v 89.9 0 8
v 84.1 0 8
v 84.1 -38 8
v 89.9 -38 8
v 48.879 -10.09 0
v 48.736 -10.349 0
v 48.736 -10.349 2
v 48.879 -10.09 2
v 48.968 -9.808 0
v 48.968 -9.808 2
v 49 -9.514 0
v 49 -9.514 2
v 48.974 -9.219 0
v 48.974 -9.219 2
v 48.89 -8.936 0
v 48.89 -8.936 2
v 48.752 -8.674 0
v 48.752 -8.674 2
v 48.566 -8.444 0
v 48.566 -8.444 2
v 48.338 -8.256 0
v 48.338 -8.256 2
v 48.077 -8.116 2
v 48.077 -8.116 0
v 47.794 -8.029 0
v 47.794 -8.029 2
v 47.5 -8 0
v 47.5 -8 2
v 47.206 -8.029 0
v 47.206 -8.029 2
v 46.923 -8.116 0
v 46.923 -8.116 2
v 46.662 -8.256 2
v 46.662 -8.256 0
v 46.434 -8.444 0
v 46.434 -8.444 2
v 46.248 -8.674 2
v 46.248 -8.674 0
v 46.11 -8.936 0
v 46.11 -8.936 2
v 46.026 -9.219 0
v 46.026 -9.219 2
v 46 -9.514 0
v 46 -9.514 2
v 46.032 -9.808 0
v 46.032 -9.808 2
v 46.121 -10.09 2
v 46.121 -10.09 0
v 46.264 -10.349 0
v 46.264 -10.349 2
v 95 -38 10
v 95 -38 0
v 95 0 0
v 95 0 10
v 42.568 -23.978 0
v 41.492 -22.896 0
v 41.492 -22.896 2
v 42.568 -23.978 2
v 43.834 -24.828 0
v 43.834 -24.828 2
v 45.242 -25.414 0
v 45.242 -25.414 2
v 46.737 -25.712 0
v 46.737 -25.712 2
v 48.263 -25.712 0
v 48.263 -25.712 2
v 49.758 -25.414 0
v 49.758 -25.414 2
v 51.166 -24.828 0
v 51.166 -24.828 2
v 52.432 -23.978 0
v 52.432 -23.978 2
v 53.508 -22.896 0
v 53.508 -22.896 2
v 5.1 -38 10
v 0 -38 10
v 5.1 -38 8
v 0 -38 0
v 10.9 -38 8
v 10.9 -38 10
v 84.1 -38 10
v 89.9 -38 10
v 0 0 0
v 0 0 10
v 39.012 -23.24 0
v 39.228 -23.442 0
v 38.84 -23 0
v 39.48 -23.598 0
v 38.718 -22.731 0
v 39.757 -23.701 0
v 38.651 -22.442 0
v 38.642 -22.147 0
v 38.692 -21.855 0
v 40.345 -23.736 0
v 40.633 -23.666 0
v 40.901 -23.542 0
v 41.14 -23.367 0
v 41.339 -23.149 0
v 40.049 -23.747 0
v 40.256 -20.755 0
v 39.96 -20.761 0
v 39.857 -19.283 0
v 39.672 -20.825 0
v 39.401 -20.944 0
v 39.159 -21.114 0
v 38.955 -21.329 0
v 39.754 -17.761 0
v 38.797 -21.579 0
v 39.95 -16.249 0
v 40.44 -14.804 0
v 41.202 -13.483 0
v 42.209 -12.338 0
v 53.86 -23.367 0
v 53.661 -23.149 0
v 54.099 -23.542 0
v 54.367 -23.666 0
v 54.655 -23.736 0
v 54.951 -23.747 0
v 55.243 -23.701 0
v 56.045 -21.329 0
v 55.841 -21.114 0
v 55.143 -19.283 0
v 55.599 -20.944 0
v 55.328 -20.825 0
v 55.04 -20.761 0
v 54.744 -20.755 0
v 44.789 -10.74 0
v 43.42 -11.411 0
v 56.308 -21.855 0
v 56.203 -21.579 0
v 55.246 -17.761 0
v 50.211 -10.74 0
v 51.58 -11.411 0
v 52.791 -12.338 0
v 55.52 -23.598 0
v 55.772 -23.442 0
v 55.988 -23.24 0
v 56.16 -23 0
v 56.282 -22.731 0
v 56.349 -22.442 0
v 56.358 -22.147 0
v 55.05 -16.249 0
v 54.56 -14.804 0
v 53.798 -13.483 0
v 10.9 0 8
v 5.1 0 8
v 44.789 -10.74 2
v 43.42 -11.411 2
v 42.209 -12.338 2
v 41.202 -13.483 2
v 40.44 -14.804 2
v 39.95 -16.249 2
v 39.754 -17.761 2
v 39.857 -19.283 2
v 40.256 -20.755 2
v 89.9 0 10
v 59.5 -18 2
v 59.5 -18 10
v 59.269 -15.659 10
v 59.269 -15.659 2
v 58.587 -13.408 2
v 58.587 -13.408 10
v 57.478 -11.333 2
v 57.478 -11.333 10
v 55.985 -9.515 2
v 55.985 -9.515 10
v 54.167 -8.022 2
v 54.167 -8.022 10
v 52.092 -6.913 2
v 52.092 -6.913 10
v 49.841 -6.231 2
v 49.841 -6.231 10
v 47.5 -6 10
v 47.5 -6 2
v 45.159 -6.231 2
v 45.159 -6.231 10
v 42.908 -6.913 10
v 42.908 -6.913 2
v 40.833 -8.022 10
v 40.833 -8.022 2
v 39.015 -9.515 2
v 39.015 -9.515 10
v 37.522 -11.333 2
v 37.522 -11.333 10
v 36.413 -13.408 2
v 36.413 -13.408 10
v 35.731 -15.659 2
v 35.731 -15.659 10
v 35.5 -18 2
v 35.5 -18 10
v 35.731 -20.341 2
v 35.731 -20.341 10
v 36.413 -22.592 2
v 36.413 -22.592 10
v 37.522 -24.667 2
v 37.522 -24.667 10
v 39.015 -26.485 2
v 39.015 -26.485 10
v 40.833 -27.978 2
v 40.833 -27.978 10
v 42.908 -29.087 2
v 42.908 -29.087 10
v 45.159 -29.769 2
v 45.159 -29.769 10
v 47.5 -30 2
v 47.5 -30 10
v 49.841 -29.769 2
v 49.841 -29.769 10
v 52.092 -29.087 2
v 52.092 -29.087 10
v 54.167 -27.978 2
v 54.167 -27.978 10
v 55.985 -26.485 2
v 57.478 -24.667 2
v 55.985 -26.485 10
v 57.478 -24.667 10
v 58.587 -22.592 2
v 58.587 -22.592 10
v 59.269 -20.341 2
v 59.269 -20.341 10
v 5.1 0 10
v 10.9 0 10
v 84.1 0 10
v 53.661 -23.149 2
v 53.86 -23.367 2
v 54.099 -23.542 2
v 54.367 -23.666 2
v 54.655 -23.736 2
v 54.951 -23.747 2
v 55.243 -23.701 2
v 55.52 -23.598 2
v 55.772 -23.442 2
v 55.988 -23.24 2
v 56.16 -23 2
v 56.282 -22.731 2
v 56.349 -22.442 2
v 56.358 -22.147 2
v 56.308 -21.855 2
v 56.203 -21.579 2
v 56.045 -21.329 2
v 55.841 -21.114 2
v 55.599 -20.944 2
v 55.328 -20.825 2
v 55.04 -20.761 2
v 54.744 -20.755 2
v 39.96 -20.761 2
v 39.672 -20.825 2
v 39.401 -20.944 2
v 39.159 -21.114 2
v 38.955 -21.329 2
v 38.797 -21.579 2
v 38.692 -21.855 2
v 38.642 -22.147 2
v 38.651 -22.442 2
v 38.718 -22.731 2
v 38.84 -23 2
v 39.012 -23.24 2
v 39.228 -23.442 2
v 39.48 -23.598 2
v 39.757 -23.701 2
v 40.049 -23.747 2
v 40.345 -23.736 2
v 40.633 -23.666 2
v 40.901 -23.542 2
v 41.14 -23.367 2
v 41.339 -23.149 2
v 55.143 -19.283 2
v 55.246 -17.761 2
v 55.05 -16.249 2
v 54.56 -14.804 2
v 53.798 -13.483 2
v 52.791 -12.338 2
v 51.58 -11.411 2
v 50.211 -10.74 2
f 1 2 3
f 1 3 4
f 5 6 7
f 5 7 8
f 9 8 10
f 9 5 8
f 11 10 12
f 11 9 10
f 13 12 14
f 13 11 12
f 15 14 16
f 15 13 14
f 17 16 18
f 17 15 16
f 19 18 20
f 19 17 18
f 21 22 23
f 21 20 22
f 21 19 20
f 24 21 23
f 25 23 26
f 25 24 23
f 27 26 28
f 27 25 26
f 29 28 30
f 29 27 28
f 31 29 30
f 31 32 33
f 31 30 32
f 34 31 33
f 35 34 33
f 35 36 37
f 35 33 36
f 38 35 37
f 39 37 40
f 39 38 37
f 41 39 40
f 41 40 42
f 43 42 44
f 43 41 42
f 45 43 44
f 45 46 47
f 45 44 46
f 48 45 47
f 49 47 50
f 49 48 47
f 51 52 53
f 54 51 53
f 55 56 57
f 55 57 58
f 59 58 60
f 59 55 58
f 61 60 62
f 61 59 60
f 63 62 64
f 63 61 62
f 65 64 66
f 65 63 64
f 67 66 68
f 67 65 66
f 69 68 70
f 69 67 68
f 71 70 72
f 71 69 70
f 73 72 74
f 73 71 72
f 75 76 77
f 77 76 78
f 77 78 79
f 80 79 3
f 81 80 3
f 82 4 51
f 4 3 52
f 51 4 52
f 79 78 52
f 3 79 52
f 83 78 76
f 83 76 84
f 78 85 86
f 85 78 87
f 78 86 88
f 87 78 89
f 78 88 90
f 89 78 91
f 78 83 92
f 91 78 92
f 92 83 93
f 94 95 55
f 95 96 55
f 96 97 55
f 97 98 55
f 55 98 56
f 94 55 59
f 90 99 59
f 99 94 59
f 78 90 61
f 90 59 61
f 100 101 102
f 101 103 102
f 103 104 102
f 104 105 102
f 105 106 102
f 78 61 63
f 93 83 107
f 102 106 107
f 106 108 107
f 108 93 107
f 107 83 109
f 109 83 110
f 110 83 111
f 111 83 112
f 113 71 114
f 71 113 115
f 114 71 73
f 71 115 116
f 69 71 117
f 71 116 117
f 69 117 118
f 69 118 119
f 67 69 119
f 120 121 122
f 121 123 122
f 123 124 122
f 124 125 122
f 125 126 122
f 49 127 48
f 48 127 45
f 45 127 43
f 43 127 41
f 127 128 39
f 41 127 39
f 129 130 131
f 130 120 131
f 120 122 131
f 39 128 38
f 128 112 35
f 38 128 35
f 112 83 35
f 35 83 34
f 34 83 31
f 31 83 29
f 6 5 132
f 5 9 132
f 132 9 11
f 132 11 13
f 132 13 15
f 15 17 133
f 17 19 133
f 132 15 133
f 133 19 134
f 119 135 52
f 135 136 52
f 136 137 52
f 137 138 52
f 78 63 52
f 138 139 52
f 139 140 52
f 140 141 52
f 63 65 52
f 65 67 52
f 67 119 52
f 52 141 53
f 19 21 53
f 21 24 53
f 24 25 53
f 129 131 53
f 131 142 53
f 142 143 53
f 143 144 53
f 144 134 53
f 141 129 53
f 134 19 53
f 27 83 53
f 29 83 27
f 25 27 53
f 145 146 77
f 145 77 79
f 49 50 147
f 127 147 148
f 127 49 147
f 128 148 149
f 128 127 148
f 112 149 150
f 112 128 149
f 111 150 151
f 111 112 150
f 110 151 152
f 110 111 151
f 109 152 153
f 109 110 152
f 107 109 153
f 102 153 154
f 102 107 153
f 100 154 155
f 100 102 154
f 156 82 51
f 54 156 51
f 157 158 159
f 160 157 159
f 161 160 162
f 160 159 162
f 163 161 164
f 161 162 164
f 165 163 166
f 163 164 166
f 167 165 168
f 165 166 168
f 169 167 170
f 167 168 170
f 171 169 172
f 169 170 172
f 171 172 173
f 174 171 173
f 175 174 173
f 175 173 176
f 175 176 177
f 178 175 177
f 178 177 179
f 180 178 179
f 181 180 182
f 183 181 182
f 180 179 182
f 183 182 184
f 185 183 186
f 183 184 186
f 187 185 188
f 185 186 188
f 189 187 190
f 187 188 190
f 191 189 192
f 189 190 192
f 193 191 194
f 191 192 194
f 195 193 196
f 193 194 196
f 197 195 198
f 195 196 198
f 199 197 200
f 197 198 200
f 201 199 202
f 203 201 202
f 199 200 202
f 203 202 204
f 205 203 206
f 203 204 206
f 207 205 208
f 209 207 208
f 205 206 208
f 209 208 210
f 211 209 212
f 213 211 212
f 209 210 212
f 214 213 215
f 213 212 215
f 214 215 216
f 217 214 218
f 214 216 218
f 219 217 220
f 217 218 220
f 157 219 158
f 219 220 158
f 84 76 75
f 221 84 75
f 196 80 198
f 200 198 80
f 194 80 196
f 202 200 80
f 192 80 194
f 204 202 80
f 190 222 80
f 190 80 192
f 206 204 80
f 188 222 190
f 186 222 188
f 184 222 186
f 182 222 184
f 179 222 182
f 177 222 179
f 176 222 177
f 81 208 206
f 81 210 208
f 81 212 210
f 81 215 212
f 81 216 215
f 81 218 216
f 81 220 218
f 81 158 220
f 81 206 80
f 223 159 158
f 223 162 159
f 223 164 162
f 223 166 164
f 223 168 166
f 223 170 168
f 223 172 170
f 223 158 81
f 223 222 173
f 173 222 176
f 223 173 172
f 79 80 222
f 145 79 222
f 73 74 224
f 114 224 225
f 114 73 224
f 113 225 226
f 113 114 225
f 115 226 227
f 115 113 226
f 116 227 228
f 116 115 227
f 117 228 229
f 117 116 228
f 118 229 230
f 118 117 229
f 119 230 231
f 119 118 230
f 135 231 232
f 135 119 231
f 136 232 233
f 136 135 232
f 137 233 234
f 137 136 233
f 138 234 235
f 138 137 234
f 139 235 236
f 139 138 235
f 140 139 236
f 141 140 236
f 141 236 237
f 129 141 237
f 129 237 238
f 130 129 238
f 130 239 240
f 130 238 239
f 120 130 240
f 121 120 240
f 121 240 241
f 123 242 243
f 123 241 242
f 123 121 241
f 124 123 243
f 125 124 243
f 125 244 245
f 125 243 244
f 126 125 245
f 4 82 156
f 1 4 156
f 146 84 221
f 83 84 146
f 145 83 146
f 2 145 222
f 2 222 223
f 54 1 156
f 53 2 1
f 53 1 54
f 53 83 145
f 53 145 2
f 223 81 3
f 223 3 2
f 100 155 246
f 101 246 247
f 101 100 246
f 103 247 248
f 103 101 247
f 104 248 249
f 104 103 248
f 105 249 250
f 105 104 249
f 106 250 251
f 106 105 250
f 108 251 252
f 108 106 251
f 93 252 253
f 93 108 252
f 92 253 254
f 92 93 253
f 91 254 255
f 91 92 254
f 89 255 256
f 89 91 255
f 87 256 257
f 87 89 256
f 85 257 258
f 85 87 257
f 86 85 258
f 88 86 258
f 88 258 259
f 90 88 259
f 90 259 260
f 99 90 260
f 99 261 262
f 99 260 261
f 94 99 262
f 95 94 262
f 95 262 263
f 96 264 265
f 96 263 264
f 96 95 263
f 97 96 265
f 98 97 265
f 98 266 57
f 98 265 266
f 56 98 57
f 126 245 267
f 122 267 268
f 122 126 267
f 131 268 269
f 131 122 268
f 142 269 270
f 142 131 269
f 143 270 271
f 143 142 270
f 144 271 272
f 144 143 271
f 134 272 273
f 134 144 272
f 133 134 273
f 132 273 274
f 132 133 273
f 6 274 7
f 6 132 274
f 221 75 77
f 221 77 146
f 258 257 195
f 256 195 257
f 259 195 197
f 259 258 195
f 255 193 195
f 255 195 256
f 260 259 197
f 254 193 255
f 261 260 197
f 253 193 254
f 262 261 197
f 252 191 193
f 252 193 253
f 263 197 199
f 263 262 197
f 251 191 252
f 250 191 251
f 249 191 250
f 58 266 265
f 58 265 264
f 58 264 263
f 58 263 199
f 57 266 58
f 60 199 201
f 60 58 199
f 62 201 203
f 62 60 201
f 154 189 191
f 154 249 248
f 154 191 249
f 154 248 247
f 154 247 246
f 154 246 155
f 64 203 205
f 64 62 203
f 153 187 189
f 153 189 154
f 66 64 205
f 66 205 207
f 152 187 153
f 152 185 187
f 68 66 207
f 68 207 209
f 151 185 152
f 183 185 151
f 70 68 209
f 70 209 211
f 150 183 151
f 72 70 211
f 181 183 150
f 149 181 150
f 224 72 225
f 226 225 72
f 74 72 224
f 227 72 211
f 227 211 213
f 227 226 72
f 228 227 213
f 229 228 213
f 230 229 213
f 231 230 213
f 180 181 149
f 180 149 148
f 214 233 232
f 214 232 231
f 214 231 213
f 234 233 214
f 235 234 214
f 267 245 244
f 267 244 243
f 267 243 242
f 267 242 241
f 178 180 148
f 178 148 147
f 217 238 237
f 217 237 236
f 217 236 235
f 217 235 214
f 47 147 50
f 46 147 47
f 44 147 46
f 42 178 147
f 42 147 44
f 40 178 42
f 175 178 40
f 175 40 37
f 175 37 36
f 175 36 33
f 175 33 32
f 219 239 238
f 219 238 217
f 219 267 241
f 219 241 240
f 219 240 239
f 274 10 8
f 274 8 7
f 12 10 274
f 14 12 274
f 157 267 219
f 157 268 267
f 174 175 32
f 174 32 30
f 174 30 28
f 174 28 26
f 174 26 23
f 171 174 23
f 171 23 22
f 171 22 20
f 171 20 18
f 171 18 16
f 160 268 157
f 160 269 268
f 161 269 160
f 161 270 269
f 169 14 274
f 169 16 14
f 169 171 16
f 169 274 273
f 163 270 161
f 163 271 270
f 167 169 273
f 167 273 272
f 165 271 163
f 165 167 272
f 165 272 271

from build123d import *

# Parameters (mm, degrees)
ESQUISSE1_W      = 95
ESQUISSE1_H      = 38
EXTRUSION1_DEPTH = 10
ESQUISSE3_R      = 12
EXTRUSION3_DEPTH = 8
ESQUISSE4_W      = 5.8
ESQUISSE4_H      = 38
EXTRUSION4_DEPTH = 2


with BuildPart() as part:
    # Esquisse1 → Extrusion1 (new body)
    with BuildSketch(Plane.XY):
        with Locations((47.5, -19)):
            Rectangle(ESQUISSE1_W, ESQUISSE1_H)
        with BuildLine():
            ThreePointArc((46.263573917, -10.349264706), (40.788303121, -14.125), (40.256055836, -20.754591249))
            ThreePointArc((40.256055836, -20.754591249), (38.839745962, -23), (41.492481919, -22.896144045))
            ThreePointArc((41.492481919, -22.896144045), (47.5, -25.75), (53.507518081, -22.896144045))
            ThreePointArc((53.507518081, -22.896144045), (56.160254038, -23), (54.743944164, -20.754591249))
            ThreePointArc((54.743944164, -20.754591249), (54.211696879, -14.125), (48.736426083, -10.349264706))
            ThreePointArc((48.736426083, -10.349264706), (47.5, -8), (46.263573917, -10.349264706))
        make_face(mode=Mode.SUBTRACT)
    extrude(amount=EXTRUSION1_DEPTH)

    # Esquisse3 → Extrusion3 (cut)
    with BuildSketch(Plane.XY.offset(10)):
        with Locations((47.5, -18)):
            Circle(ESQUISSE3_R)
    extrude(amount=-EXTRUSION3_DEPTH, mode=Mode.SUBTRACT)

    # Esquisse4 → Extrusion4 (cut)
    with BuildSketch(Plane.XY.offset(10)):
        with Locations((8, -19)):
            Rectangle(ESQUISSE4_W, ESQUISSE4_H)
        with Locations((87, -19)):
            Rectangle(ESQUISSE4_W, ESQUISSE4_H)
    extrude(amount=-EXTRUSION4_DEPTH, mode=Mode.SUBTRACT)


solid = part.part
